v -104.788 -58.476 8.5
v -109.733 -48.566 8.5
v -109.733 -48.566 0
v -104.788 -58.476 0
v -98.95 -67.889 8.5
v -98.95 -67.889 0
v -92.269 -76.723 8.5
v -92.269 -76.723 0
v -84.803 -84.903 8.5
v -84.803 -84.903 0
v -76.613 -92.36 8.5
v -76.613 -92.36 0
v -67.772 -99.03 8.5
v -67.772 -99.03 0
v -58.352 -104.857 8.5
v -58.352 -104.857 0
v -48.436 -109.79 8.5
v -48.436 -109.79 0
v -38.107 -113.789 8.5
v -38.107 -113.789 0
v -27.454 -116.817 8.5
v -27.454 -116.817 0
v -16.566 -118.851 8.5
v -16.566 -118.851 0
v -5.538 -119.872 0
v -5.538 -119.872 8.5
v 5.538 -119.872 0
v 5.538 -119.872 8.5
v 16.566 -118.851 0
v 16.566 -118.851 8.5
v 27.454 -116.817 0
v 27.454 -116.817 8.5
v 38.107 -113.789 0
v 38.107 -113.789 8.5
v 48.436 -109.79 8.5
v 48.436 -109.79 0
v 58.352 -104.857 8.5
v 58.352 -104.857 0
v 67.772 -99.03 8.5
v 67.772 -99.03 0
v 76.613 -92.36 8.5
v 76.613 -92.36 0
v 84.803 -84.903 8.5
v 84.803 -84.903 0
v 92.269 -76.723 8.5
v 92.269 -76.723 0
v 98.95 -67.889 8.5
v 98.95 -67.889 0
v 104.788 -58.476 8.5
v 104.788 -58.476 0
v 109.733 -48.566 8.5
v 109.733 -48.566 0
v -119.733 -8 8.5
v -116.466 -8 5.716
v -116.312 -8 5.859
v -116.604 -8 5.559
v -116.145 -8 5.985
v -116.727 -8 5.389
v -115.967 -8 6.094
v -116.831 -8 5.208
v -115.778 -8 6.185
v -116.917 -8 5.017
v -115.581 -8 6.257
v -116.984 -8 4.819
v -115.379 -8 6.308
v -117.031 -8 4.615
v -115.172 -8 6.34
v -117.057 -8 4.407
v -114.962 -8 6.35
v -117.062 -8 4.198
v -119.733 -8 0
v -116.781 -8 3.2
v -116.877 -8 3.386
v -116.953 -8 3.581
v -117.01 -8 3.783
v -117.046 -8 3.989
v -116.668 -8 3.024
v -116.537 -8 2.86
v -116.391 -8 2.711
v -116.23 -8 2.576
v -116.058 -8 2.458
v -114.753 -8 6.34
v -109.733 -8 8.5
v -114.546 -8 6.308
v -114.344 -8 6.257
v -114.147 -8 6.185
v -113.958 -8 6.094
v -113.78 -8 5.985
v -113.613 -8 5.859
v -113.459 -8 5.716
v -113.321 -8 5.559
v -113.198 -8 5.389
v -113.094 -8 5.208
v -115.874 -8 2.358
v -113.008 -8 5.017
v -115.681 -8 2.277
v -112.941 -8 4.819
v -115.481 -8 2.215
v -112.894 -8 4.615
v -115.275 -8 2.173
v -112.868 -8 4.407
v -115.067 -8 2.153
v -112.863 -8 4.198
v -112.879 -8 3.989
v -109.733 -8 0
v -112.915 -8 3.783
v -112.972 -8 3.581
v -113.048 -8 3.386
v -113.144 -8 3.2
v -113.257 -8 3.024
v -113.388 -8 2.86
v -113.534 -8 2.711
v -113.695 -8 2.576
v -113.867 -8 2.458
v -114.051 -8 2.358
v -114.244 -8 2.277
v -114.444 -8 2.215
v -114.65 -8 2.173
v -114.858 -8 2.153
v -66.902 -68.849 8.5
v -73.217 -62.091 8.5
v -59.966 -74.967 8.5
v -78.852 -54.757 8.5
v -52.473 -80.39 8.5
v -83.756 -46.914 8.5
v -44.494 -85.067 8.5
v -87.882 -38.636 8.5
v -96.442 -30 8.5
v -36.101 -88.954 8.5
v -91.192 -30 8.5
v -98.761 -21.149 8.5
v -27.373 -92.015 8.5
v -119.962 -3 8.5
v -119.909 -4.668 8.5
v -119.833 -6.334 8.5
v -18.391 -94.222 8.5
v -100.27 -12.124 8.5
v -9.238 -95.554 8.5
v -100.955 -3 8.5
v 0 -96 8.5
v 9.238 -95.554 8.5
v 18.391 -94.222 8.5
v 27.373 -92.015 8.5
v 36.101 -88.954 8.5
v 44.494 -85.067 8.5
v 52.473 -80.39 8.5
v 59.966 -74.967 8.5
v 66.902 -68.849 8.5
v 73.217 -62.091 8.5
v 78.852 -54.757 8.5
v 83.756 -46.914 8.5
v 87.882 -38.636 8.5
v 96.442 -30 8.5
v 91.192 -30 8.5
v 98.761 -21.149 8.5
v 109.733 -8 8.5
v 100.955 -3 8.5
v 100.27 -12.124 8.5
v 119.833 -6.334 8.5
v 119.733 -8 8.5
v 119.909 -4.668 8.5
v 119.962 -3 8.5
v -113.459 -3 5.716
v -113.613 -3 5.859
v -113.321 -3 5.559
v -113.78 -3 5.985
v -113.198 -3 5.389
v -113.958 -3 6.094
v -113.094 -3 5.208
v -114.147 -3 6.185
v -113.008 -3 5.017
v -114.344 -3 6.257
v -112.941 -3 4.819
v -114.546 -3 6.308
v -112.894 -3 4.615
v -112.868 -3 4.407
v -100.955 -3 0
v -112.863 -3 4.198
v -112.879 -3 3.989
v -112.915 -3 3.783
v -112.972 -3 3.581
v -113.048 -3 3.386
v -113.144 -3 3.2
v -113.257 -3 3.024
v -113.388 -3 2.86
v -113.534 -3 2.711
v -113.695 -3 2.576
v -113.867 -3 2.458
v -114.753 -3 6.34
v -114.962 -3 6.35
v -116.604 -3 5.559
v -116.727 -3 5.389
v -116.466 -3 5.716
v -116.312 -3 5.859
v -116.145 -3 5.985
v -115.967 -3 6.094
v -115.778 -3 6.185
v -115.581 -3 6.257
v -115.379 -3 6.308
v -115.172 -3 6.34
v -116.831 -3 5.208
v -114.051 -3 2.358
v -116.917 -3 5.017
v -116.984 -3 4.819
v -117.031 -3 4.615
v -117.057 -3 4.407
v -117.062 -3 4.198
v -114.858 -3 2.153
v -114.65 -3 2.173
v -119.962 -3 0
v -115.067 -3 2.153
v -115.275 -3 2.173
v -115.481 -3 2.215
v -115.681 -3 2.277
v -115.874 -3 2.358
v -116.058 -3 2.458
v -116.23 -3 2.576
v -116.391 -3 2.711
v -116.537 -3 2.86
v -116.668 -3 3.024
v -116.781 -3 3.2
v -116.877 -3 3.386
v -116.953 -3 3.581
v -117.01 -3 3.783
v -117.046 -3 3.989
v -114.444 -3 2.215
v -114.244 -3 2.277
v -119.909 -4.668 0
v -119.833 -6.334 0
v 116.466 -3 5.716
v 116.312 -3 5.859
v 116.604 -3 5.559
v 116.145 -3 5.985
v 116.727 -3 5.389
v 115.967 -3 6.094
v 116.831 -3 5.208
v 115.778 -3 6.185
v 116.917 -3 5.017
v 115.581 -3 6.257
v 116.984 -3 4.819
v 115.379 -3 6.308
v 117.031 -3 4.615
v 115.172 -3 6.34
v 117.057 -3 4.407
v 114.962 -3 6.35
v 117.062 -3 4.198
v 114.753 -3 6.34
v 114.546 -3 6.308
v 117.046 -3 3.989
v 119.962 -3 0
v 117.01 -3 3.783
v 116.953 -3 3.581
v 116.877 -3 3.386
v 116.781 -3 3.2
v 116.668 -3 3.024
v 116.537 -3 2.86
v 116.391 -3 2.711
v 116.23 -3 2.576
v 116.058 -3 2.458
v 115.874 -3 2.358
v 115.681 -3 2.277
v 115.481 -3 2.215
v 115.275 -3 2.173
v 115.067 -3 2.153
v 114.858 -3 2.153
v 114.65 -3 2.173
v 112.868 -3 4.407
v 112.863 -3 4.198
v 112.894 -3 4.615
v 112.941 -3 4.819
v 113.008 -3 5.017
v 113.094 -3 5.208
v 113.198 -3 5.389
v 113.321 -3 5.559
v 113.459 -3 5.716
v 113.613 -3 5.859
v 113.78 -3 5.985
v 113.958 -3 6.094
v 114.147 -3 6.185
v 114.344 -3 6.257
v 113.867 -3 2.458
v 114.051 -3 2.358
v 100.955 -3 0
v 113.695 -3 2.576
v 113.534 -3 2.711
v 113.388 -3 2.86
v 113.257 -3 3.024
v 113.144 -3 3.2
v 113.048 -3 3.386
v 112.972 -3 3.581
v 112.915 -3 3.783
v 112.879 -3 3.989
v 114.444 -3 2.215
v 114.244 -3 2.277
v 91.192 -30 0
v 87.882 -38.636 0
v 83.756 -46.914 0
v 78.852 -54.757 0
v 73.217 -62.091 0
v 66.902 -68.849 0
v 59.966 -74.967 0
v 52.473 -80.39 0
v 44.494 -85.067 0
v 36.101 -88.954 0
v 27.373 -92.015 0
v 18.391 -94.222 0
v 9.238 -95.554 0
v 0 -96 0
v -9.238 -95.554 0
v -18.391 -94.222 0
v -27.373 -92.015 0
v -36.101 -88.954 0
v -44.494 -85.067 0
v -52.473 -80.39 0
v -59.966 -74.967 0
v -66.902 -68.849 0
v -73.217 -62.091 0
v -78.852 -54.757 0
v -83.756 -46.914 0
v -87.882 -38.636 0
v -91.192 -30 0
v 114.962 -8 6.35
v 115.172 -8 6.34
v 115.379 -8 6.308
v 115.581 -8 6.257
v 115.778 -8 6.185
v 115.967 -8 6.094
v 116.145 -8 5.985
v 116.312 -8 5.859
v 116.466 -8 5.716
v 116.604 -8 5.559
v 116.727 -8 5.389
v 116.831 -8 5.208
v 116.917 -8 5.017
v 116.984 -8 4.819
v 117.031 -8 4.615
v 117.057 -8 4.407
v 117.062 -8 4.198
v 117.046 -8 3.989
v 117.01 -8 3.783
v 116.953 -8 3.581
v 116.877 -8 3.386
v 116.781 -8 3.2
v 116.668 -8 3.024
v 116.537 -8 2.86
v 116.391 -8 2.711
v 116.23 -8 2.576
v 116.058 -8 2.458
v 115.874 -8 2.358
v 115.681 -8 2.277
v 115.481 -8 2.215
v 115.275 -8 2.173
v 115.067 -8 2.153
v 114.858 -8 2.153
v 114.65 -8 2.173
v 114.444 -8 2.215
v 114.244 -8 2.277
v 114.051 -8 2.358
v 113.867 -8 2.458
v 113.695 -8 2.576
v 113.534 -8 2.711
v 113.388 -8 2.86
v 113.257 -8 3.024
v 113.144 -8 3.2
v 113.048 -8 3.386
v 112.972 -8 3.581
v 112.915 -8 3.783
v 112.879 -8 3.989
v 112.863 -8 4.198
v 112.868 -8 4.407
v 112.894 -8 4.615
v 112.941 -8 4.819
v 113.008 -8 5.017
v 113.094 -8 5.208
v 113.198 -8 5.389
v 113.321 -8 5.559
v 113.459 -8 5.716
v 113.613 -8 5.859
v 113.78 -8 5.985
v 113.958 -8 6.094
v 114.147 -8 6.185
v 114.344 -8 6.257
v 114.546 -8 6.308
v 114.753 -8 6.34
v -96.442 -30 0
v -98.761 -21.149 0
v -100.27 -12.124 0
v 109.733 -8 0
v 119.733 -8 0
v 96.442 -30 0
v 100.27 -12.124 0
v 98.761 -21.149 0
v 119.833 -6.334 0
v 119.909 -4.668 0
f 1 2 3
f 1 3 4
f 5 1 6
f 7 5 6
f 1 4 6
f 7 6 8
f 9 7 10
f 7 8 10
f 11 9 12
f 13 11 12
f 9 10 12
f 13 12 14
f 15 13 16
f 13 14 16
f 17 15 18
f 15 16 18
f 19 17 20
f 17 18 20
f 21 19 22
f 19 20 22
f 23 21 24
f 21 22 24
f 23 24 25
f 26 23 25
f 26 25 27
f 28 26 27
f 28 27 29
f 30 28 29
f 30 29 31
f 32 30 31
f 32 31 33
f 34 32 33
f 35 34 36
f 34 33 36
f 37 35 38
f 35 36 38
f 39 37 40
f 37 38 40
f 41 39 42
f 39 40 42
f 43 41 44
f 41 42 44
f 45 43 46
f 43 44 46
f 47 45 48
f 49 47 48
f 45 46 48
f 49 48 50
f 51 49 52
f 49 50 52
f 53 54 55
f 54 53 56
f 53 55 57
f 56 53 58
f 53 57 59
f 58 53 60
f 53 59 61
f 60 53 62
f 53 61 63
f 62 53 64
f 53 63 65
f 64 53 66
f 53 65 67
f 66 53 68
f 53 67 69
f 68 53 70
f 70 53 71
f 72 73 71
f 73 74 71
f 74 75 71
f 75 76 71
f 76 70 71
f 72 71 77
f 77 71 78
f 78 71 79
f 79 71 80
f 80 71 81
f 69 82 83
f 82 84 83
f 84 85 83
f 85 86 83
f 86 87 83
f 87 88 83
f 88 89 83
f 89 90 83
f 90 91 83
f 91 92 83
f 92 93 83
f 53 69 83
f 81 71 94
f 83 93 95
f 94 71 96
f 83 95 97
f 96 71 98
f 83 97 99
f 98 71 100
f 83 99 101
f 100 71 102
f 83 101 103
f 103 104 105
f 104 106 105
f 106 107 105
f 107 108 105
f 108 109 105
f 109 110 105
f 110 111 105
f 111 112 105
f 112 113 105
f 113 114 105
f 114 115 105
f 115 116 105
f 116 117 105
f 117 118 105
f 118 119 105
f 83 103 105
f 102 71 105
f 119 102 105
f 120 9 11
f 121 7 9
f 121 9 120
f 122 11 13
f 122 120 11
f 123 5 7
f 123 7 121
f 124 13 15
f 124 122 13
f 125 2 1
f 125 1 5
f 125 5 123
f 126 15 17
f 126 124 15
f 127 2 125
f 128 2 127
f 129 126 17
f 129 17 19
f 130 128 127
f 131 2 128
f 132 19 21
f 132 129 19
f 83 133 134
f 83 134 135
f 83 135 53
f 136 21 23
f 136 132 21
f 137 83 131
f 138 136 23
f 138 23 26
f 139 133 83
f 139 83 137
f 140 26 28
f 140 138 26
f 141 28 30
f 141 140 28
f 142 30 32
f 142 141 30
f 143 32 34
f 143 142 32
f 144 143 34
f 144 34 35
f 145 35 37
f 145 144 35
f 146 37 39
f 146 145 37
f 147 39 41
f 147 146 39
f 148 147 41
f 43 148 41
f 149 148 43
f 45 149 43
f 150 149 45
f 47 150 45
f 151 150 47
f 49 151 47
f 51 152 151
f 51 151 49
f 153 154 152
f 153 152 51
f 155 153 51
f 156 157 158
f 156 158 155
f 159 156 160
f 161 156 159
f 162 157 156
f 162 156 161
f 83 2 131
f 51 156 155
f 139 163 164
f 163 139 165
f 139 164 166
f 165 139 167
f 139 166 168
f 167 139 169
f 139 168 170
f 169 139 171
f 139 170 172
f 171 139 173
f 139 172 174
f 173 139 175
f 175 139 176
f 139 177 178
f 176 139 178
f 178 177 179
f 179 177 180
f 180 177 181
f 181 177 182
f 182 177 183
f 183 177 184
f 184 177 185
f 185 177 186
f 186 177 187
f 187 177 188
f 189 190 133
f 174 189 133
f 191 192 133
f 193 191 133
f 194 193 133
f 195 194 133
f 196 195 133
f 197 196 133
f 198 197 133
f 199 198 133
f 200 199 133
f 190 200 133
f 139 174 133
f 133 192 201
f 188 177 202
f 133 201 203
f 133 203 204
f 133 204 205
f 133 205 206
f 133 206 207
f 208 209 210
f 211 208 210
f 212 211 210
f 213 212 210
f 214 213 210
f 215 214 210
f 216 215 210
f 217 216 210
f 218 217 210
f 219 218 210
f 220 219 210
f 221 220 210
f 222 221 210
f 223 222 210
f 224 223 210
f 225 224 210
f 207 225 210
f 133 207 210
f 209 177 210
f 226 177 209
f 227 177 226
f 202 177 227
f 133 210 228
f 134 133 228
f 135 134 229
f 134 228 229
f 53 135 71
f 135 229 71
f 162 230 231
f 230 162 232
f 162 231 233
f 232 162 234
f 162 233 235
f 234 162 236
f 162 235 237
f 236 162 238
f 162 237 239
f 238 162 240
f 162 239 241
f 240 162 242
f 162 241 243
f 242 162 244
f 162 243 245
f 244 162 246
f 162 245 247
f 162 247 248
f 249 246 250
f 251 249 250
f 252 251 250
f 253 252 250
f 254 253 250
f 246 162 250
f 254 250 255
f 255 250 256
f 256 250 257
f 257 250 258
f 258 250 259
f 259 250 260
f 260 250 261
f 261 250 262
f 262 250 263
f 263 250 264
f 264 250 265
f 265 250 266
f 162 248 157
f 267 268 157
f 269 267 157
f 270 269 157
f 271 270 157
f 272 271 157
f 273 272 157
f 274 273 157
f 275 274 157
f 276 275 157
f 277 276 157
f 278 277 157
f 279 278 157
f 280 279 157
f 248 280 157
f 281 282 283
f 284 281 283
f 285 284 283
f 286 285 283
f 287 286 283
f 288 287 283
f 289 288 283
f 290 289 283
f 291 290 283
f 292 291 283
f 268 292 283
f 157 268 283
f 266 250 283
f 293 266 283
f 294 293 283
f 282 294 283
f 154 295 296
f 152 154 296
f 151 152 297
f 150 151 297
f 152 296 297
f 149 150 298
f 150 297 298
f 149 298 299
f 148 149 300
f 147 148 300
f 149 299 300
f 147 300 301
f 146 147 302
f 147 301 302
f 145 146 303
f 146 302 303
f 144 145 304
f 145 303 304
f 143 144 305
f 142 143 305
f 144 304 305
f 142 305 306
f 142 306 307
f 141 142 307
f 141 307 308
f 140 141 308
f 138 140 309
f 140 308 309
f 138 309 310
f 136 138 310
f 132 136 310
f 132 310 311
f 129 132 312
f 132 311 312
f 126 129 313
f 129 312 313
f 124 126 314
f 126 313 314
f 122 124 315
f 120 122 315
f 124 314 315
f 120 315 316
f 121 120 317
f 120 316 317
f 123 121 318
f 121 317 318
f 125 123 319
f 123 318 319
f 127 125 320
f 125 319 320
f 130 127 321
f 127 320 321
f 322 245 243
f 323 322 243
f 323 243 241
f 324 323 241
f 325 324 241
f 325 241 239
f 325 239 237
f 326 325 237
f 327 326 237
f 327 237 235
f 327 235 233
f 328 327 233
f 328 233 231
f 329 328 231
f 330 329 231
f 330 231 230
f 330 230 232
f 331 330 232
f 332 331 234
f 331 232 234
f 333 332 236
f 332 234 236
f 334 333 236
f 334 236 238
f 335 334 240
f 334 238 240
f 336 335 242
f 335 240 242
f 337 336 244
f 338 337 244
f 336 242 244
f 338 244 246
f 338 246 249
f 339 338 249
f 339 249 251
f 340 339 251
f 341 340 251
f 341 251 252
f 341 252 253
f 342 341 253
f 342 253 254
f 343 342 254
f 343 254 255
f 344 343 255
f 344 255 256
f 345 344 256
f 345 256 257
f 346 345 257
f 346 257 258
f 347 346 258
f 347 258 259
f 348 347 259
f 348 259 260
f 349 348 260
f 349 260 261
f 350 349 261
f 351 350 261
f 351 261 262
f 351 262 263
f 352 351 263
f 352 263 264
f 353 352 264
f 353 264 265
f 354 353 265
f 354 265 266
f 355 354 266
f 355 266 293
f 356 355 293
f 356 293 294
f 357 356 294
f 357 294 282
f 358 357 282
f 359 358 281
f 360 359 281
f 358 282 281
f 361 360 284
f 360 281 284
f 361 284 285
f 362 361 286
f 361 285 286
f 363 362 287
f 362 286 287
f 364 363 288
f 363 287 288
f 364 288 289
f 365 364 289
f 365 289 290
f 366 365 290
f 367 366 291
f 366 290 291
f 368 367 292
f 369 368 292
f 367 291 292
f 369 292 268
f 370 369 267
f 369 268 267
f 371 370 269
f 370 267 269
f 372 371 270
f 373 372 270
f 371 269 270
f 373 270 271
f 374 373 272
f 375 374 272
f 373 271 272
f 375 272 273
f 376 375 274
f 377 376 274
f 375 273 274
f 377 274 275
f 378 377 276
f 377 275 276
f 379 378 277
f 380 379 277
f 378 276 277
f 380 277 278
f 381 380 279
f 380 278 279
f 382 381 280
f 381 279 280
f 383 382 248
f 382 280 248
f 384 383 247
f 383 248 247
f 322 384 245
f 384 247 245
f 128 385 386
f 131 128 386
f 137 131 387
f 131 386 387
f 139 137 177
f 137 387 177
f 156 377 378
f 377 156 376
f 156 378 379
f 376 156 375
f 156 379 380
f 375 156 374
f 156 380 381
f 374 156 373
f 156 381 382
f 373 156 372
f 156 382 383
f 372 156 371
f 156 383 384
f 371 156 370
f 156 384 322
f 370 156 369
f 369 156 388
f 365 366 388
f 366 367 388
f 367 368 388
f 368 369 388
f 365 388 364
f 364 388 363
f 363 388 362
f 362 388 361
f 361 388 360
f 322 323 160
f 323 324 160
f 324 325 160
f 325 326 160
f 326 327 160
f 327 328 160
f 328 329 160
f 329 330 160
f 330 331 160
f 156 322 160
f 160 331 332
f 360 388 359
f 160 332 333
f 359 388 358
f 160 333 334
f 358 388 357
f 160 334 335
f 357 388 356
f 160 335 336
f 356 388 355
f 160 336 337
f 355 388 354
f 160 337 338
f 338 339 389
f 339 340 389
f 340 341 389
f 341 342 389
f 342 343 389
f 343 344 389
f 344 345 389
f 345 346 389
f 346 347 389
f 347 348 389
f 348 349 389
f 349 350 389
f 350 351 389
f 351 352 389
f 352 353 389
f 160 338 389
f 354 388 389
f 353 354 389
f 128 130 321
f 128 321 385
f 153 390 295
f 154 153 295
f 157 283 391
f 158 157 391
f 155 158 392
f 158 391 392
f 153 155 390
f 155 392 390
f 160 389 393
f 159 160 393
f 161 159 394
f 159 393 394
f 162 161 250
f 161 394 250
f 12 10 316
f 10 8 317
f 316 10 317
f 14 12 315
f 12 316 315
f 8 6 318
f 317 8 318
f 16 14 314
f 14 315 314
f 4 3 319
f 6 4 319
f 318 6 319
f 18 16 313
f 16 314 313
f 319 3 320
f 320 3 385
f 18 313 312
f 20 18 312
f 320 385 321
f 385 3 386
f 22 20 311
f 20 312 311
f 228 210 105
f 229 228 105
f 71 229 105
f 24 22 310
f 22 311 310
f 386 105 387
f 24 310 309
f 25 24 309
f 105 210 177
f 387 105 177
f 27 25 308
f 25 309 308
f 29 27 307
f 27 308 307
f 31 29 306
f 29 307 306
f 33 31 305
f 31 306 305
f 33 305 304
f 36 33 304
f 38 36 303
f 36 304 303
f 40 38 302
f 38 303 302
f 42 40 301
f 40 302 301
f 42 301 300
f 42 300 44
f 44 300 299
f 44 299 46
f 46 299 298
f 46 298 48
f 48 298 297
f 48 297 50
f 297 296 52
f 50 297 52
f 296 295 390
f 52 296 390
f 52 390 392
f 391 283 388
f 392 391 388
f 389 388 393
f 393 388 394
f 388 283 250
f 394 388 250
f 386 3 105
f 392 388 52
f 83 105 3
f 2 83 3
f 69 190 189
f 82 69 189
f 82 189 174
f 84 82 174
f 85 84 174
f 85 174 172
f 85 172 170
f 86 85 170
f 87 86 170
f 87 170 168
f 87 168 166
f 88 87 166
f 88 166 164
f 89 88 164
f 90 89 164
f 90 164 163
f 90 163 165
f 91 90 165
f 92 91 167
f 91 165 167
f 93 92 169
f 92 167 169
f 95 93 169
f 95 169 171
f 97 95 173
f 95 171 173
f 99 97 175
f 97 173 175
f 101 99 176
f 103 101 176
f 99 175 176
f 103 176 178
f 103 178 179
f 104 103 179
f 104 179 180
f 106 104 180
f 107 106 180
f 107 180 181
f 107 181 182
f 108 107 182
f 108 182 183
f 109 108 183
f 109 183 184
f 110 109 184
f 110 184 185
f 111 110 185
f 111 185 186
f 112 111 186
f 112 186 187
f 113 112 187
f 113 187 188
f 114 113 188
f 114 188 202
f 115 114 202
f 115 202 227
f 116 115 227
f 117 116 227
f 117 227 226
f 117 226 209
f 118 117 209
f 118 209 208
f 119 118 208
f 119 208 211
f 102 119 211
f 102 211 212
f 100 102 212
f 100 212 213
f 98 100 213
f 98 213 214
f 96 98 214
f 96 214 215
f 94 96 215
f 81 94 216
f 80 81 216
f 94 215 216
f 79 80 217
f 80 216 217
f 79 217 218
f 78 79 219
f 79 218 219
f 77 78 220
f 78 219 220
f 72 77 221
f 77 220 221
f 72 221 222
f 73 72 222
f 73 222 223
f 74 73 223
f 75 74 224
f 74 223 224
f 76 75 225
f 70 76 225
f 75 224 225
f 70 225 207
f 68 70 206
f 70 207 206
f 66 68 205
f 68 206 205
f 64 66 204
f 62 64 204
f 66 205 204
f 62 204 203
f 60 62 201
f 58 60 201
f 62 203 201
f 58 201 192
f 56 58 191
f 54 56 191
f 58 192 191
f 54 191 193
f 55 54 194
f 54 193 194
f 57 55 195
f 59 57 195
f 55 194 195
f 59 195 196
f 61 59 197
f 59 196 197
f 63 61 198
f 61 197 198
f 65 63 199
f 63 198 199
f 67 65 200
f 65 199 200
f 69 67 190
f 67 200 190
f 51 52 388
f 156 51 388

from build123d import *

# Parameters (mm, degrees)
EXTRUDE_1_DEPTH     = 8.5
SKETCH_2_R          = 2.1
CUT_EXTRUDE_1_DEPTH = 10


with BuildPart() as part:
    # 草图1 → 凸台-拉伸1 (new body)
    with BuildSketch(Plane.XY):
        with BuildLine():
            Line((-119.733036377, -8), (-109.733036377, -8))
            Line((-109.733036377, -8), (-109.733036377, -48.566045006))
            ThreePointArc((-109.733036377, -48.566045006), (0, -120), (109.733036377, -48.566045006))
            Line((109.733036377, -48.566045006), (109.733036377, -8))
            Line((109.733036377, -8), (119.733036377, -8))
            ThreePointArc((119.733036377, -8), (119.873837168, -5.50119648), (119.962494139, -3))
            Line((119.962494139, -3), (100.955435713, -3))
            ThreePointArc((100.955435713, -3), (99.617551315, -16.653632338), (96.441692229, -30))
            Line((96.441692229, -30), (91.192104921, -30))
            ThreePointArc((91.192104921, -30), (0, -96), (-91.192104921, -30))
            Line((-91.192104921, -30), (-96.441692229, -30))
            ThreePointArc((-96.441692229, -30), (-99.617551315, -16.653632338), (-100.955435713, -3))
            Line((-100.955435713, -3), (-119.962494139, -3))
            ThreePointArc((-119.962494139, -3), (-119.873837168, -5.50119648), (-119.733036377, -8))
        make_face()
    extrude(amount=EXTRUDE_1_DEPTH)

    # 草图2 → 切除-拉伸1 (cut)
    with BuildSketch(Plane(origin=(0, -3, 0), x_dir=(1, 0, 0), z_dir=(0, 1, 0))):
        with Locations(Location((-114.962494139, -4.25, 0), (0, 0, 270))):
            Circle(SKETCH_2_R)
        with Locations(Location((114.962494139, -4.25, 0), (0, 0, 270))):
            Circle(SKETCH_2_R)
    extrude(amount=-CUT_EXTRUDE_1_DEPTH, mode=Mode.SUBTRACT)


solid = part.part
